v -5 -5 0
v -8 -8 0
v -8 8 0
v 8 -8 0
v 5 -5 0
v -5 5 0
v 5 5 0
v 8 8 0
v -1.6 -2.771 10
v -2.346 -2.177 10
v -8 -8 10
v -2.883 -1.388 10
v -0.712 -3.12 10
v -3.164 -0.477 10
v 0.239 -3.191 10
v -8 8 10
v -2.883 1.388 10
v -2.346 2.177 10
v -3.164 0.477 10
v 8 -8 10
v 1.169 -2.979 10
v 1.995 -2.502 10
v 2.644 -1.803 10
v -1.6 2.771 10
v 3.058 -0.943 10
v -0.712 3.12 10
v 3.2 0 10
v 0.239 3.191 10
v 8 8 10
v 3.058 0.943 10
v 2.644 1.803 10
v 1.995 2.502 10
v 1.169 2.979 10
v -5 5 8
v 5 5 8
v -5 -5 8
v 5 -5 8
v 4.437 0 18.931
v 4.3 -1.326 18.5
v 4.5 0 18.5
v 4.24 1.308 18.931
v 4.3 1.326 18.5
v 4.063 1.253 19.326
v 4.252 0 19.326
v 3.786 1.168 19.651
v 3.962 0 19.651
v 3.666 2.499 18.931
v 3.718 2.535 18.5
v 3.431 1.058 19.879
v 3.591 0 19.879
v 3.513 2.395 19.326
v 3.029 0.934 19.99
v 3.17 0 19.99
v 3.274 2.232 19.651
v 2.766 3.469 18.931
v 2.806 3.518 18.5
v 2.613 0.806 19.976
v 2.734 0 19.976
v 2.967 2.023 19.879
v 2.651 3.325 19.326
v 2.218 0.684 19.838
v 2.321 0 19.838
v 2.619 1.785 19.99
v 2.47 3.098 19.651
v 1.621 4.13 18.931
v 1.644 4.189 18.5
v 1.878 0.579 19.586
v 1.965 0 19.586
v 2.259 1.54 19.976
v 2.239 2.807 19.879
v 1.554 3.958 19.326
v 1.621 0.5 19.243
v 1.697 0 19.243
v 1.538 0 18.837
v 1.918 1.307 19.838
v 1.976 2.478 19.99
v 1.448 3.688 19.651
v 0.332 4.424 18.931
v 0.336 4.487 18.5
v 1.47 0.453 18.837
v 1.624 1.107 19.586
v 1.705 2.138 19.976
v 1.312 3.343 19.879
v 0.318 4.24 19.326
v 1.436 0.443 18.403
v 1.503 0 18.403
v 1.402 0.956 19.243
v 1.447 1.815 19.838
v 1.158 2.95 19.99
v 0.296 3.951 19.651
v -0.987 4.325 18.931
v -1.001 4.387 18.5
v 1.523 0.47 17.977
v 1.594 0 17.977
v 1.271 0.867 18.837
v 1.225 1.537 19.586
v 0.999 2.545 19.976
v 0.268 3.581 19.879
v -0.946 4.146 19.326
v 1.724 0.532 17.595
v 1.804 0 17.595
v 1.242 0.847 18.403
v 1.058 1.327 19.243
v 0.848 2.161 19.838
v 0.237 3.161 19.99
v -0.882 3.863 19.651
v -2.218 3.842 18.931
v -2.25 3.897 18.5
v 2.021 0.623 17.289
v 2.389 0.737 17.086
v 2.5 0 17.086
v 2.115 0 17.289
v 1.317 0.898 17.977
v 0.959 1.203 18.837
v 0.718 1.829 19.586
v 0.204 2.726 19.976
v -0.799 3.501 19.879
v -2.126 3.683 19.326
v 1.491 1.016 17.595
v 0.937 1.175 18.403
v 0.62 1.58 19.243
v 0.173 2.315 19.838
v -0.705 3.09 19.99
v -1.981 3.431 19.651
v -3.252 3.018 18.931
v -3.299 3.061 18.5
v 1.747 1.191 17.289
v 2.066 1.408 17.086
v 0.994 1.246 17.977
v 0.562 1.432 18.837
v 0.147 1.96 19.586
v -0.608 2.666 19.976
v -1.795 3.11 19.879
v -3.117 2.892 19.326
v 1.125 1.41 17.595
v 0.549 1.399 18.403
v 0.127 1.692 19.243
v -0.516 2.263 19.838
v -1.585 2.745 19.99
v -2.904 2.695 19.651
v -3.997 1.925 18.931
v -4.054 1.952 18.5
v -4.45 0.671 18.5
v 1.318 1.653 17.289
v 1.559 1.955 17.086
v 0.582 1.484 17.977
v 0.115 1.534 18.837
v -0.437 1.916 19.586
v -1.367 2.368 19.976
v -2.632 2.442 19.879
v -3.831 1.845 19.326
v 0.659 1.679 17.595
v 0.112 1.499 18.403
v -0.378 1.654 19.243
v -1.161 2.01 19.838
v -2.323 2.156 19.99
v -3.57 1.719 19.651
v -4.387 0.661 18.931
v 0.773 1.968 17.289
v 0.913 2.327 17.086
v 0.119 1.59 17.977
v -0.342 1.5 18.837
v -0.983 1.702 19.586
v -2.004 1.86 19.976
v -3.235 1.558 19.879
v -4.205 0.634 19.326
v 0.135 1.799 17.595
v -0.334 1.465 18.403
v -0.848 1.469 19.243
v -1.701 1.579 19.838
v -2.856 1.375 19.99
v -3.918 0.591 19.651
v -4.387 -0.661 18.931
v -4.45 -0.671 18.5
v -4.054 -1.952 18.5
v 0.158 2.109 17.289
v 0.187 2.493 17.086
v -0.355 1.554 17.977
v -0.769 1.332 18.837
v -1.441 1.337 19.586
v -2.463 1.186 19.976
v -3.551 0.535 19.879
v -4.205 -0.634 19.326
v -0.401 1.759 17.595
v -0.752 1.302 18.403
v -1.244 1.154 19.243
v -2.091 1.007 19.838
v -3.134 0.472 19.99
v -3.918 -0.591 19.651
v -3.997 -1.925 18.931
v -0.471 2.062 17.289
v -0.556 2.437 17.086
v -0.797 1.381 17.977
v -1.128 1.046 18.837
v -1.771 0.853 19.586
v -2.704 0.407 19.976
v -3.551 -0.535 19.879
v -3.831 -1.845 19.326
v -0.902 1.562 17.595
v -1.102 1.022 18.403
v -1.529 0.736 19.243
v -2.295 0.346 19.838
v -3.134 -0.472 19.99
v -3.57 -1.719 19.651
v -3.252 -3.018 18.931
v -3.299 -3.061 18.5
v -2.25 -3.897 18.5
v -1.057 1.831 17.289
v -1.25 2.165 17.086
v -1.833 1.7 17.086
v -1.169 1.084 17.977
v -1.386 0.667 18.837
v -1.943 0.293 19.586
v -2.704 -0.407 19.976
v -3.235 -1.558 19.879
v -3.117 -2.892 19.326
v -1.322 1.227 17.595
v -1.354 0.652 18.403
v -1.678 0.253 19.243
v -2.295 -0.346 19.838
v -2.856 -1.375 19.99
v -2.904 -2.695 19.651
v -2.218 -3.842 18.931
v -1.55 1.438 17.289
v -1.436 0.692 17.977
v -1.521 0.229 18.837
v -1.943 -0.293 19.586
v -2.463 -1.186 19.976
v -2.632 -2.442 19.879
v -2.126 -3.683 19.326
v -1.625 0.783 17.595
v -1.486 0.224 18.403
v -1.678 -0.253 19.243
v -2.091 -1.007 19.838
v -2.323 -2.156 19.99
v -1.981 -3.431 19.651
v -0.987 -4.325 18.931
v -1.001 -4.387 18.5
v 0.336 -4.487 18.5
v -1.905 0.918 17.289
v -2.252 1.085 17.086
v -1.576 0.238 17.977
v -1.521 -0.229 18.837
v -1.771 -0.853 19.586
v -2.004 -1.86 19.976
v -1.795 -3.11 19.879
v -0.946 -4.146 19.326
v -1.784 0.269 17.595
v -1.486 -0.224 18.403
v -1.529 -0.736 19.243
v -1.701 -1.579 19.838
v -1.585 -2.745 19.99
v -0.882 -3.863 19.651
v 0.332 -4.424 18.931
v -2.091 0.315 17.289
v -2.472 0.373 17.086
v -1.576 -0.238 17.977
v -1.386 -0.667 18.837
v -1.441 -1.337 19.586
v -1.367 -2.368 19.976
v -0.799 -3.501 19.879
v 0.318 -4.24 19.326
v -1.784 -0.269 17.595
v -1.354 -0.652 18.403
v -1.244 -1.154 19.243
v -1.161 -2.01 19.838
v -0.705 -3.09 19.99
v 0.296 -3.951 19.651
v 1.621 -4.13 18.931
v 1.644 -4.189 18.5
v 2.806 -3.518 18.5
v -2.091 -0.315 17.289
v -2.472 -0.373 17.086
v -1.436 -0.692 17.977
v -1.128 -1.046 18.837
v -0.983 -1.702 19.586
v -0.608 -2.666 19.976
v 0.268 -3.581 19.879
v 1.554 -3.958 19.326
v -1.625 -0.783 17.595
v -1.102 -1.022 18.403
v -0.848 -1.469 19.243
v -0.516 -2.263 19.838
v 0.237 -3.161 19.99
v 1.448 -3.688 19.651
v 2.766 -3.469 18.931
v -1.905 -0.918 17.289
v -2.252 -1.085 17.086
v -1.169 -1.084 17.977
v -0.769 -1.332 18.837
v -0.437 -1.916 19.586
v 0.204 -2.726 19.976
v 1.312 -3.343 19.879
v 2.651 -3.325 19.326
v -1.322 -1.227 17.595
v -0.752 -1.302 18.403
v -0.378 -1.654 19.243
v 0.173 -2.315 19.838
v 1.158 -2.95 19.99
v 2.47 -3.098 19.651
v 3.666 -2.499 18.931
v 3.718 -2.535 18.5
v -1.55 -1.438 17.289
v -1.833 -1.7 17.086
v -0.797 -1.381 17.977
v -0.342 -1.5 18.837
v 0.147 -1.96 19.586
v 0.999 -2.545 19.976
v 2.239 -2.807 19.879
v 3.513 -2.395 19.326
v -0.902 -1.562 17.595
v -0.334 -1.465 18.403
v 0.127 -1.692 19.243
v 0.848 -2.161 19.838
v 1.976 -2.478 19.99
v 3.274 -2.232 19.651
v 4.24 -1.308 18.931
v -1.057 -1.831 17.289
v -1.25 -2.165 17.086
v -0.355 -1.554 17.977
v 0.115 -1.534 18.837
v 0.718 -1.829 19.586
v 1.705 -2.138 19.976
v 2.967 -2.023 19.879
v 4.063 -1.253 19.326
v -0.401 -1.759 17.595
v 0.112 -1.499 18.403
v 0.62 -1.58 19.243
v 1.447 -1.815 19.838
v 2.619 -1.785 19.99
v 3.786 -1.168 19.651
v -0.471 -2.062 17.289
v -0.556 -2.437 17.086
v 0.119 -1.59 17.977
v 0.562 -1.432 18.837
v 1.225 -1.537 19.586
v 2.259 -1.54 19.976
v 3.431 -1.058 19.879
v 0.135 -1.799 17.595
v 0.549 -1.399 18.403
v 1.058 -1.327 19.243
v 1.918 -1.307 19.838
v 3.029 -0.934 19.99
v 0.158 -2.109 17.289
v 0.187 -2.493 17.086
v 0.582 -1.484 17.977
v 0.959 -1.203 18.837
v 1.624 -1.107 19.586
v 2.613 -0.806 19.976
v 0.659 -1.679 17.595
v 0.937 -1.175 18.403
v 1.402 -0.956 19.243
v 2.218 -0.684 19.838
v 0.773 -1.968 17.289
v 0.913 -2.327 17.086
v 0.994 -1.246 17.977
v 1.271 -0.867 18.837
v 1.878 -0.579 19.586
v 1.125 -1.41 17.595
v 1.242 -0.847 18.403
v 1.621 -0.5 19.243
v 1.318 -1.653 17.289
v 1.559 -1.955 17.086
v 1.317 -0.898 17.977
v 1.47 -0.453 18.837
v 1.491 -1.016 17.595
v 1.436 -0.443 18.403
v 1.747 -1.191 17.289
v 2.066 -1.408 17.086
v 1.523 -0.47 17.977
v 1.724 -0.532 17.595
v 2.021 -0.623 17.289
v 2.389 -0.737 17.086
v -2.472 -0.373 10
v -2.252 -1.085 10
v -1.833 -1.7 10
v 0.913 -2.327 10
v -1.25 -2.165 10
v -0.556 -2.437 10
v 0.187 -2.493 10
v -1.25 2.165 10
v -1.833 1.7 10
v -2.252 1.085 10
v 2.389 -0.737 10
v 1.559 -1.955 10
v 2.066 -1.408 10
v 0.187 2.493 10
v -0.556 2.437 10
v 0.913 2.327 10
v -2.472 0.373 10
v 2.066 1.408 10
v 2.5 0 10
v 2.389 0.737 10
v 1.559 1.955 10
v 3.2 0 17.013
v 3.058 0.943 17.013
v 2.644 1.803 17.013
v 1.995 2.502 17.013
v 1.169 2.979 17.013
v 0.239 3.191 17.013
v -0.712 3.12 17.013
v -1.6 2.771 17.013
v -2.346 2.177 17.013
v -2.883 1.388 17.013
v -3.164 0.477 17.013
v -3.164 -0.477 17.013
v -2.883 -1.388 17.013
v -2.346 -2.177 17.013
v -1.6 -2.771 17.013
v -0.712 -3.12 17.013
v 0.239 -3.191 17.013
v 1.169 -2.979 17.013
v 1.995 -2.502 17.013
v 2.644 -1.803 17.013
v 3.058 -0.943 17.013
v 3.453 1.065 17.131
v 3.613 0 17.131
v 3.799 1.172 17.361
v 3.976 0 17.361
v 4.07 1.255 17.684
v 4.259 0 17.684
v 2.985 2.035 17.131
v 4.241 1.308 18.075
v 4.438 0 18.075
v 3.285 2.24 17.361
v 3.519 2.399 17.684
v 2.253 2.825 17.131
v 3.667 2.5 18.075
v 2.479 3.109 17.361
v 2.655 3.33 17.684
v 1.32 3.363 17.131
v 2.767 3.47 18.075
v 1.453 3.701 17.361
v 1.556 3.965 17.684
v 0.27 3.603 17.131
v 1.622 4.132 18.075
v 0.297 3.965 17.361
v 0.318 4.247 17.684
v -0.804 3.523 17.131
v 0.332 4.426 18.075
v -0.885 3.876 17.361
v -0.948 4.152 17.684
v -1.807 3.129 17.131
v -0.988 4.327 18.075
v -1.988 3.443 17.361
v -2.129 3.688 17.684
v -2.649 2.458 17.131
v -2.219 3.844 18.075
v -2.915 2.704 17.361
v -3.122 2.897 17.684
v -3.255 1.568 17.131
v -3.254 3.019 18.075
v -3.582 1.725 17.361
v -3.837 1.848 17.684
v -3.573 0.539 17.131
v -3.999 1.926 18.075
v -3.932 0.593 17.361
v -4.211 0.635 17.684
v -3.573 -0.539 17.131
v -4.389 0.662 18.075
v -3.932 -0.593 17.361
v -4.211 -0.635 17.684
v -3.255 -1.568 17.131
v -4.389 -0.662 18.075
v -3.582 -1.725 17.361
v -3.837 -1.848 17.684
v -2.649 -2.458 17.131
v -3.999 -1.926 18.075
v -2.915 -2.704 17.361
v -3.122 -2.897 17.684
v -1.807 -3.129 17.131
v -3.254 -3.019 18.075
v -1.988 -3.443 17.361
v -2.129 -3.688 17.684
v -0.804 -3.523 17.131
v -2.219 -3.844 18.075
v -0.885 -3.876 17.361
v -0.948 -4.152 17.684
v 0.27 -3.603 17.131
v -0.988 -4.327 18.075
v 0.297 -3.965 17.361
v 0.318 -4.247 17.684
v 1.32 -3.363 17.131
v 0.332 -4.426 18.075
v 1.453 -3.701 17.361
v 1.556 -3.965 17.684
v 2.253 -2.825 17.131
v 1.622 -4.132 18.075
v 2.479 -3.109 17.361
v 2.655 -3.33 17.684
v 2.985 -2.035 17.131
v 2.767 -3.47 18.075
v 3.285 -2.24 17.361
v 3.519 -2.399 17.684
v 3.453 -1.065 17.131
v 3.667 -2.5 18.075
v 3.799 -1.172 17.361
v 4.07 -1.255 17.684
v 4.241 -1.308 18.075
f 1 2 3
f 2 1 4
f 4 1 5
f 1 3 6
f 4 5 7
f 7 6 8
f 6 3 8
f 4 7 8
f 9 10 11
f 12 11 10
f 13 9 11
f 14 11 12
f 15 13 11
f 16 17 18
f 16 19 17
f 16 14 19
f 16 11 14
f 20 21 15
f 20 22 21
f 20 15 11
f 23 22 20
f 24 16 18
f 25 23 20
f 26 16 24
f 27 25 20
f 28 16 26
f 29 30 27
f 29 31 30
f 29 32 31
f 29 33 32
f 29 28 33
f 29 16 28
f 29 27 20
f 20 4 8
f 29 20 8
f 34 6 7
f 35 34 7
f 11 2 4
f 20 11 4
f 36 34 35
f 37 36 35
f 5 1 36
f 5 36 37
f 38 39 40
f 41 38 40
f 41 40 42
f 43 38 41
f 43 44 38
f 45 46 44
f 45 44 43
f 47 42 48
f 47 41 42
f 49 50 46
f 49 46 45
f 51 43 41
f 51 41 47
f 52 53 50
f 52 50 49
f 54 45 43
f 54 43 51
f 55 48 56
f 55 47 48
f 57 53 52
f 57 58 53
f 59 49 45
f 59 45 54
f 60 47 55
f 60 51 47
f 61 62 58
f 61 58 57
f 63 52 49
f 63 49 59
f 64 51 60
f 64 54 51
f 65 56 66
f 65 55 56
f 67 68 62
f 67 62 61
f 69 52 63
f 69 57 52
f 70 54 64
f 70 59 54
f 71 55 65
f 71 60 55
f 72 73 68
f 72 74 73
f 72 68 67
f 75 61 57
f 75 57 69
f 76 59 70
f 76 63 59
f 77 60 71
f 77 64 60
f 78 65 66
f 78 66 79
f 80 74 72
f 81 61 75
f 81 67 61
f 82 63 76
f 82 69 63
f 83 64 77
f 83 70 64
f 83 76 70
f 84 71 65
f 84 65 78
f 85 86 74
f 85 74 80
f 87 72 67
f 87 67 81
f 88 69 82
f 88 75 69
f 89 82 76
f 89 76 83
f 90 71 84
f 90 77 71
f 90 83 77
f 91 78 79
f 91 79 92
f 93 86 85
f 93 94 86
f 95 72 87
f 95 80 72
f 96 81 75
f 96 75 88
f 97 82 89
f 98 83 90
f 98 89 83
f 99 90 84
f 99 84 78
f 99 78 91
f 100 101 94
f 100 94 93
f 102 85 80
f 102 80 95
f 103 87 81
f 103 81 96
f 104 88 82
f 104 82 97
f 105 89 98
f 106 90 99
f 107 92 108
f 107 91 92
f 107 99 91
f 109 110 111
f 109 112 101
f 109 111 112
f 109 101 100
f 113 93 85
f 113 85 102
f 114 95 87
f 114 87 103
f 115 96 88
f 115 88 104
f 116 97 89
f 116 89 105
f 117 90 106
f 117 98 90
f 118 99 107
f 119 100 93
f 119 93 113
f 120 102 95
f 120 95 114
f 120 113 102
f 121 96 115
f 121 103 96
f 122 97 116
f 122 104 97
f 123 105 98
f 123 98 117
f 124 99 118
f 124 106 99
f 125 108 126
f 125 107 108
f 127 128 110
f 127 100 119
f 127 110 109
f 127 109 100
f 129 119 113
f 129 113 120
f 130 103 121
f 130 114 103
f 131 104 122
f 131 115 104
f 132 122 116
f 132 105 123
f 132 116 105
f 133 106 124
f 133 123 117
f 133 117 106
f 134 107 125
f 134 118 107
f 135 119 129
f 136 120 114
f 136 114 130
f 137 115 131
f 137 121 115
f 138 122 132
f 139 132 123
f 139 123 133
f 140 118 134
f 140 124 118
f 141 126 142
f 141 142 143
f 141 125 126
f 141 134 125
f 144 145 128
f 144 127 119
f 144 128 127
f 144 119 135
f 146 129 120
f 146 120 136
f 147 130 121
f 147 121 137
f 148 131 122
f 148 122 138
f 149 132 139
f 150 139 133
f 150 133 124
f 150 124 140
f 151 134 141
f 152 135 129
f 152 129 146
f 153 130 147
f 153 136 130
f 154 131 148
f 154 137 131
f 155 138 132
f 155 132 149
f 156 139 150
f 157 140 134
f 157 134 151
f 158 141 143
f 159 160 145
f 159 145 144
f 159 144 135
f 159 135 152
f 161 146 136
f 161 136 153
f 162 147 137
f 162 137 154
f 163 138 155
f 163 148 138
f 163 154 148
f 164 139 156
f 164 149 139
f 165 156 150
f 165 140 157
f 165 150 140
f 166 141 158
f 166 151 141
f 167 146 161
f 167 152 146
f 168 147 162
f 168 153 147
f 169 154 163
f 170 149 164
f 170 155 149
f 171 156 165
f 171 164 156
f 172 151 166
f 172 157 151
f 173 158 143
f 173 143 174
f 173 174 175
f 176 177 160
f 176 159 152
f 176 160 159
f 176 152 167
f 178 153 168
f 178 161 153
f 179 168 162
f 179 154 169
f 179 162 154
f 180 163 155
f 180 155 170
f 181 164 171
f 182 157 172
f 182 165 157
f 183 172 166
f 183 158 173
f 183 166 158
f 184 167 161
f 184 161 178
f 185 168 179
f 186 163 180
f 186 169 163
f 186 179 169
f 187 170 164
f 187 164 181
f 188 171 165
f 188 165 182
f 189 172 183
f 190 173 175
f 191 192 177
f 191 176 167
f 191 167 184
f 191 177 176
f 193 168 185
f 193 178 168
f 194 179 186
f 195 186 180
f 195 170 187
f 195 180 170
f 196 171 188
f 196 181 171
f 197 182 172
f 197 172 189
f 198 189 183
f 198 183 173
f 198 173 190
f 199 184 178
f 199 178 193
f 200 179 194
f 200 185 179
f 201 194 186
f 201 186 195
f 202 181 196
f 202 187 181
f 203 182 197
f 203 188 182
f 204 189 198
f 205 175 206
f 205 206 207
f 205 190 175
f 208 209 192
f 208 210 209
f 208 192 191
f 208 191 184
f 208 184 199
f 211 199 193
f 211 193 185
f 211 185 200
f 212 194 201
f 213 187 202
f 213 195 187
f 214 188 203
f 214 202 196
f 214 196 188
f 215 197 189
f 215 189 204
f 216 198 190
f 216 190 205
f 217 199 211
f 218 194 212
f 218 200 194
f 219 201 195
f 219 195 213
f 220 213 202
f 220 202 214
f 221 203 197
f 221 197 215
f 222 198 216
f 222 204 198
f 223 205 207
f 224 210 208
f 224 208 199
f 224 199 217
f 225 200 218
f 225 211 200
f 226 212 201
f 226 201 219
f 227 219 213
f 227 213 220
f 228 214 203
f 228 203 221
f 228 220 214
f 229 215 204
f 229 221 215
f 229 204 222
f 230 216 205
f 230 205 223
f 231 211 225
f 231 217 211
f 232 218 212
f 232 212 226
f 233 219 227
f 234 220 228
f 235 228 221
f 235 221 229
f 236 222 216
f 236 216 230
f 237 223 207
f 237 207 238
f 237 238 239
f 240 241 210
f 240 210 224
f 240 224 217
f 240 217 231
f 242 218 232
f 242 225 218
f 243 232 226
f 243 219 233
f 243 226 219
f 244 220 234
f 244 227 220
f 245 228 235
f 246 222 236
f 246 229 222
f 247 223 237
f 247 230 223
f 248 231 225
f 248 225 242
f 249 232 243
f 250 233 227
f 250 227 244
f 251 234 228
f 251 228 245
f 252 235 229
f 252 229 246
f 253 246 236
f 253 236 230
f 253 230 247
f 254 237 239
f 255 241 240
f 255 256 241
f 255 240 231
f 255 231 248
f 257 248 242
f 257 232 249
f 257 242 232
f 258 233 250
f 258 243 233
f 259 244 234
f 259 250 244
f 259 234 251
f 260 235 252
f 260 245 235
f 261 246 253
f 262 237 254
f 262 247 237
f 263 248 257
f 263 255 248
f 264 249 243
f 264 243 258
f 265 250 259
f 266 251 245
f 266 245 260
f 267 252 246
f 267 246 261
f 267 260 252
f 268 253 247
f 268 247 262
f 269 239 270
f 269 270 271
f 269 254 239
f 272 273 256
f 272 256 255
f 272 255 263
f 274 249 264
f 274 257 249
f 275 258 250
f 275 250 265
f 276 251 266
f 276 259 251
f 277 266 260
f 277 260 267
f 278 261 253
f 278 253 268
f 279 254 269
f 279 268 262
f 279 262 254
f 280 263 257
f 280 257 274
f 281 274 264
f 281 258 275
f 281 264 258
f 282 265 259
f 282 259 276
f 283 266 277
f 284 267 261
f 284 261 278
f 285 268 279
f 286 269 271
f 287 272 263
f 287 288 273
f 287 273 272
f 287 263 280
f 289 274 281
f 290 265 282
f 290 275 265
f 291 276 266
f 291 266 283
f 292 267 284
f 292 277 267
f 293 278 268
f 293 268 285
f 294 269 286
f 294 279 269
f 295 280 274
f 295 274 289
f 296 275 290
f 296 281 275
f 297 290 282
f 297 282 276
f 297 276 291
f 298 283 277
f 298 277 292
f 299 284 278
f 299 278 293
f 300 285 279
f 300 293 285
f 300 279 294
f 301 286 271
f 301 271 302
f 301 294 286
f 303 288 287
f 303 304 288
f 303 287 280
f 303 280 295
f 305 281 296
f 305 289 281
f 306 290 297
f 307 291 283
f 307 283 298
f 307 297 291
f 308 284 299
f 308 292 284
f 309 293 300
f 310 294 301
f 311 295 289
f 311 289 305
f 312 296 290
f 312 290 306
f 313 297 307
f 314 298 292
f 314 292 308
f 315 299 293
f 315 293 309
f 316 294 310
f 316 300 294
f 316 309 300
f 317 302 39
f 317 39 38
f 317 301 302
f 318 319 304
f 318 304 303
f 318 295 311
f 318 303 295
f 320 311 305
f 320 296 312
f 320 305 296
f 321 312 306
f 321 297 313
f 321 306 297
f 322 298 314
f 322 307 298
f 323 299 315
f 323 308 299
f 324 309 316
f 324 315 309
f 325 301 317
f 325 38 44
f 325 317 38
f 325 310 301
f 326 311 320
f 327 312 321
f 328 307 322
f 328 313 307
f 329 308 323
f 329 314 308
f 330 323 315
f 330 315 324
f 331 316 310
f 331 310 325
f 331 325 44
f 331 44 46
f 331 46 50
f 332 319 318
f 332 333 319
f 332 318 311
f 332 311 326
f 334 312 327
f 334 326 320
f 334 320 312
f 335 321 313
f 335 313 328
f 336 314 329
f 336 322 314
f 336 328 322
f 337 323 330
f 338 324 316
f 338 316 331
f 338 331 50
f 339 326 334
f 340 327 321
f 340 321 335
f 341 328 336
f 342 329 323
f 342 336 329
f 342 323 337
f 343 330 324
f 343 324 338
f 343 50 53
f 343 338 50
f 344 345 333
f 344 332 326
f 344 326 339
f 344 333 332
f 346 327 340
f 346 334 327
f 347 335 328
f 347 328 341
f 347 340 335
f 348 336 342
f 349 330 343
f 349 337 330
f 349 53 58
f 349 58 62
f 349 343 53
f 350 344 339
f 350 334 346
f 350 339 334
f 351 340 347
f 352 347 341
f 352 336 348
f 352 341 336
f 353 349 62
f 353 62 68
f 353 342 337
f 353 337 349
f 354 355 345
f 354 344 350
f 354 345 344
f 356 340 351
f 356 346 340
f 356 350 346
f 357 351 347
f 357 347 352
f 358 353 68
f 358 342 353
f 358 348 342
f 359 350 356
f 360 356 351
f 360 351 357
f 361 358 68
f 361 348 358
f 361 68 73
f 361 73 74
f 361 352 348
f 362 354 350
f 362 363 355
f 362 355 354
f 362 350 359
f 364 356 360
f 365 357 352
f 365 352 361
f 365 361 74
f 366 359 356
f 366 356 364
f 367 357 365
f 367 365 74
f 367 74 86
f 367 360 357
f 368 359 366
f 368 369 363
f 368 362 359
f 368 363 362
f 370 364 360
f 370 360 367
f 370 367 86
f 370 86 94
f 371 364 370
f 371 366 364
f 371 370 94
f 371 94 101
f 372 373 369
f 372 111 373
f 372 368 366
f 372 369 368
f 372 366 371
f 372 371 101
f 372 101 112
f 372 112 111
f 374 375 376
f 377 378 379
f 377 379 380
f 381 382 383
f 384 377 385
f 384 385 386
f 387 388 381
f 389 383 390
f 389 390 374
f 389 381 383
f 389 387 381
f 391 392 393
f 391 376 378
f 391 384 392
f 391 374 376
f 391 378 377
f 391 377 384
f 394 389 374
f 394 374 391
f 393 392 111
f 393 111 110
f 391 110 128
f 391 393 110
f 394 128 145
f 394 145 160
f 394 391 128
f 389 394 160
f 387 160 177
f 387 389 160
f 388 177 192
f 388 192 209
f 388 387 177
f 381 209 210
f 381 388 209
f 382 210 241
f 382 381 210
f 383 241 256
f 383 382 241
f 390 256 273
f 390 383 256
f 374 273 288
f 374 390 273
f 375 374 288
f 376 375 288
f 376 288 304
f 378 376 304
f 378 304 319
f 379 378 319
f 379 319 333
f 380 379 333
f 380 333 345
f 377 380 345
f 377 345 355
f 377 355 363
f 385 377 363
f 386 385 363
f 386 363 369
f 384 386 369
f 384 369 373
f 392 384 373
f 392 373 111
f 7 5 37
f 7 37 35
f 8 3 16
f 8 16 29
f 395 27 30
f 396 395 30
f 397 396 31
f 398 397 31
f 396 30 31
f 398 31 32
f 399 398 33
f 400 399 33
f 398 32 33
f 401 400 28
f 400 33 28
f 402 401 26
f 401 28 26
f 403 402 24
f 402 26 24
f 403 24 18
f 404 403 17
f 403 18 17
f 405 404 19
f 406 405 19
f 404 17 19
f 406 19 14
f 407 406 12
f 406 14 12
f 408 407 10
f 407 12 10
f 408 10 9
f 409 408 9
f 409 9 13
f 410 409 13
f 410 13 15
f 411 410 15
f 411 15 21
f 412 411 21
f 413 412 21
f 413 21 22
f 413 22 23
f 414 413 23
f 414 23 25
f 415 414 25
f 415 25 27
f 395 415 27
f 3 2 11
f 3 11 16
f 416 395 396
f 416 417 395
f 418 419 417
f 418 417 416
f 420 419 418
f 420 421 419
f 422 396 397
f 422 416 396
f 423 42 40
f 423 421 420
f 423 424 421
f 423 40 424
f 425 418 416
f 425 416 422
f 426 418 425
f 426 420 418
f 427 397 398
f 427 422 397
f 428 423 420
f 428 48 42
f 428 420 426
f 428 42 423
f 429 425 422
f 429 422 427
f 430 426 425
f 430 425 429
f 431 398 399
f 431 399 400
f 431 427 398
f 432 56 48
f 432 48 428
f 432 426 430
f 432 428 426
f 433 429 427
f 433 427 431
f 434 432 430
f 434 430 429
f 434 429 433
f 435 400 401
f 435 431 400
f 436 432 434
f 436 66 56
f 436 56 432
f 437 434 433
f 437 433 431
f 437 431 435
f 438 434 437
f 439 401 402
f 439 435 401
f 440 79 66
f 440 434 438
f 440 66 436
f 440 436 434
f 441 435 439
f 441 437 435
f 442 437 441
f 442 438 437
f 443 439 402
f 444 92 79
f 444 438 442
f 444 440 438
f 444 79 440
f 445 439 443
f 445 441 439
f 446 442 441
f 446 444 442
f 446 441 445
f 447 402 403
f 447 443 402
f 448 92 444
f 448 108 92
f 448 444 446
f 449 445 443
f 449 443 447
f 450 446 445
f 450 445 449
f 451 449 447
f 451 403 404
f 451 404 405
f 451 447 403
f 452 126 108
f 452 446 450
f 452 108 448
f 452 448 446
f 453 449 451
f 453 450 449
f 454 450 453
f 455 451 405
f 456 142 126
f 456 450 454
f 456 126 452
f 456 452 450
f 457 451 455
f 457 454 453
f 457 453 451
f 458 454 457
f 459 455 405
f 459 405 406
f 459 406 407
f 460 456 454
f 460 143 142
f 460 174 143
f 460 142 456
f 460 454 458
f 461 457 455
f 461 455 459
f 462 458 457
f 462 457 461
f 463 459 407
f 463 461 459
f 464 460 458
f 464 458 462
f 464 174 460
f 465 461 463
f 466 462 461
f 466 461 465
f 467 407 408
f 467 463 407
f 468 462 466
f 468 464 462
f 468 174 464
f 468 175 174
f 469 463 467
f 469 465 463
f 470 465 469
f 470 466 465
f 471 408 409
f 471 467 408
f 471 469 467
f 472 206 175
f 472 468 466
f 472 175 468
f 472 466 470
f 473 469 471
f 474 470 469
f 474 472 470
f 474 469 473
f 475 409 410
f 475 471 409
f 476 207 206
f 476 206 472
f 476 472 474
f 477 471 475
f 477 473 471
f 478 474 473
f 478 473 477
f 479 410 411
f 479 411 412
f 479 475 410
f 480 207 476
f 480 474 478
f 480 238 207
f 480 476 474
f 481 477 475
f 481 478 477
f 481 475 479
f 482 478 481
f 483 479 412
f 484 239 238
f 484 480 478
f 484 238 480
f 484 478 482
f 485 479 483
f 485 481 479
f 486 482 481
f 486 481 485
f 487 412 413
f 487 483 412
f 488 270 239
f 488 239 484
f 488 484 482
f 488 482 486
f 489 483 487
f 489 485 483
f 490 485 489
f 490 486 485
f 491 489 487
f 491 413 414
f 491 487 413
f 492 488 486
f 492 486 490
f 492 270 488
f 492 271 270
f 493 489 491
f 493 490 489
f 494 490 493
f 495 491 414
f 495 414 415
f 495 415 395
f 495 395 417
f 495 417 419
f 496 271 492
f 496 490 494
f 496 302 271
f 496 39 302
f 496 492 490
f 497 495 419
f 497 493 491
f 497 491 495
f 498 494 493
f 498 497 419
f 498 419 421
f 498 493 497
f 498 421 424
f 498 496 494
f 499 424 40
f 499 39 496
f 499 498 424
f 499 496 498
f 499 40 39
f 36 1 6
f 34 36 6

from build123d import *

# Parameters (mm, degrees)
BOX001_W          = 10
BOX001_H          = 10
BOX001_DEPTH      = 8
BOX_W             = 16
BOX_H             = 16
BOX_DEPTH         = 10
TORUS_R           = 1.5
CYLINDER_R        = 2.5
CYLINDER_DEPTH    = 9
CYLINDER001_R     = 3.2
CYLINDER001_DEPTH = 9


with BuildPart() as cube001:
    # Box001 → Box001 (new body)
    with BuildSketch(Plane(origin=(-5, -5, 0), x_dir=(1, 0, 0), z_dir=(0, 0, 1))):
        with Locations((5, 5)):
            Rectangle(BOX001_W, BOX001_H)
    extrude(amount=BOX001_DEPTH)


with BuildPart() as cube:
    # Box → Box (new body)
    with BuildSketch(Plane(origin=(-8, -8, 0), x_dir=(1, 0, 0), z_dir=(0, 0, 1))):
        with Locations((8, 8)):
            Rectangle(BOX_W, BOX_H)
    extrude(amount=BOX_DEPTH)


with BuildPart() as torus:
    # Torus → Torus (revolve)
    with BuildSketch(Plane(origin=(0, 0, 18.5), x_dir=(1, 0, 0), z_dir=(0, -1, 0))):
        with Locations((3, 0)):
            Circle(TORUS_R)
    revolve(axis=Axis((0, 0, 18.5), (0, 0, 1)))


with BuildPart() as cylinder:
    # Cylinder → Cylinder (new body)
    with BuildSketch(Plane.XY.offset(10)):
        Circle(CYLINDER_R)
    extrude(amount=CYLINDER_DEPTH)


with BuildPart() as cut001:
    # Cylinder001 → Cylinder001 (new body)
    with BuildSketch(Plane.XY.offset(10)):
        Circle(CYLINDER001_R)
    extrude(amount=CYLINDER001_DEPTH)

    # Cut: cut Cylinder
    add(cylinder.part, mode=Mode.SUBTRACT)

    # Fusion: union Cube, Torus
    add(cube.part)
    add(torus.part)

    # Cut001: cut Cube001
    add(cube001.part, mode=Mode.SUBTRACT)


solid = cut001.part
